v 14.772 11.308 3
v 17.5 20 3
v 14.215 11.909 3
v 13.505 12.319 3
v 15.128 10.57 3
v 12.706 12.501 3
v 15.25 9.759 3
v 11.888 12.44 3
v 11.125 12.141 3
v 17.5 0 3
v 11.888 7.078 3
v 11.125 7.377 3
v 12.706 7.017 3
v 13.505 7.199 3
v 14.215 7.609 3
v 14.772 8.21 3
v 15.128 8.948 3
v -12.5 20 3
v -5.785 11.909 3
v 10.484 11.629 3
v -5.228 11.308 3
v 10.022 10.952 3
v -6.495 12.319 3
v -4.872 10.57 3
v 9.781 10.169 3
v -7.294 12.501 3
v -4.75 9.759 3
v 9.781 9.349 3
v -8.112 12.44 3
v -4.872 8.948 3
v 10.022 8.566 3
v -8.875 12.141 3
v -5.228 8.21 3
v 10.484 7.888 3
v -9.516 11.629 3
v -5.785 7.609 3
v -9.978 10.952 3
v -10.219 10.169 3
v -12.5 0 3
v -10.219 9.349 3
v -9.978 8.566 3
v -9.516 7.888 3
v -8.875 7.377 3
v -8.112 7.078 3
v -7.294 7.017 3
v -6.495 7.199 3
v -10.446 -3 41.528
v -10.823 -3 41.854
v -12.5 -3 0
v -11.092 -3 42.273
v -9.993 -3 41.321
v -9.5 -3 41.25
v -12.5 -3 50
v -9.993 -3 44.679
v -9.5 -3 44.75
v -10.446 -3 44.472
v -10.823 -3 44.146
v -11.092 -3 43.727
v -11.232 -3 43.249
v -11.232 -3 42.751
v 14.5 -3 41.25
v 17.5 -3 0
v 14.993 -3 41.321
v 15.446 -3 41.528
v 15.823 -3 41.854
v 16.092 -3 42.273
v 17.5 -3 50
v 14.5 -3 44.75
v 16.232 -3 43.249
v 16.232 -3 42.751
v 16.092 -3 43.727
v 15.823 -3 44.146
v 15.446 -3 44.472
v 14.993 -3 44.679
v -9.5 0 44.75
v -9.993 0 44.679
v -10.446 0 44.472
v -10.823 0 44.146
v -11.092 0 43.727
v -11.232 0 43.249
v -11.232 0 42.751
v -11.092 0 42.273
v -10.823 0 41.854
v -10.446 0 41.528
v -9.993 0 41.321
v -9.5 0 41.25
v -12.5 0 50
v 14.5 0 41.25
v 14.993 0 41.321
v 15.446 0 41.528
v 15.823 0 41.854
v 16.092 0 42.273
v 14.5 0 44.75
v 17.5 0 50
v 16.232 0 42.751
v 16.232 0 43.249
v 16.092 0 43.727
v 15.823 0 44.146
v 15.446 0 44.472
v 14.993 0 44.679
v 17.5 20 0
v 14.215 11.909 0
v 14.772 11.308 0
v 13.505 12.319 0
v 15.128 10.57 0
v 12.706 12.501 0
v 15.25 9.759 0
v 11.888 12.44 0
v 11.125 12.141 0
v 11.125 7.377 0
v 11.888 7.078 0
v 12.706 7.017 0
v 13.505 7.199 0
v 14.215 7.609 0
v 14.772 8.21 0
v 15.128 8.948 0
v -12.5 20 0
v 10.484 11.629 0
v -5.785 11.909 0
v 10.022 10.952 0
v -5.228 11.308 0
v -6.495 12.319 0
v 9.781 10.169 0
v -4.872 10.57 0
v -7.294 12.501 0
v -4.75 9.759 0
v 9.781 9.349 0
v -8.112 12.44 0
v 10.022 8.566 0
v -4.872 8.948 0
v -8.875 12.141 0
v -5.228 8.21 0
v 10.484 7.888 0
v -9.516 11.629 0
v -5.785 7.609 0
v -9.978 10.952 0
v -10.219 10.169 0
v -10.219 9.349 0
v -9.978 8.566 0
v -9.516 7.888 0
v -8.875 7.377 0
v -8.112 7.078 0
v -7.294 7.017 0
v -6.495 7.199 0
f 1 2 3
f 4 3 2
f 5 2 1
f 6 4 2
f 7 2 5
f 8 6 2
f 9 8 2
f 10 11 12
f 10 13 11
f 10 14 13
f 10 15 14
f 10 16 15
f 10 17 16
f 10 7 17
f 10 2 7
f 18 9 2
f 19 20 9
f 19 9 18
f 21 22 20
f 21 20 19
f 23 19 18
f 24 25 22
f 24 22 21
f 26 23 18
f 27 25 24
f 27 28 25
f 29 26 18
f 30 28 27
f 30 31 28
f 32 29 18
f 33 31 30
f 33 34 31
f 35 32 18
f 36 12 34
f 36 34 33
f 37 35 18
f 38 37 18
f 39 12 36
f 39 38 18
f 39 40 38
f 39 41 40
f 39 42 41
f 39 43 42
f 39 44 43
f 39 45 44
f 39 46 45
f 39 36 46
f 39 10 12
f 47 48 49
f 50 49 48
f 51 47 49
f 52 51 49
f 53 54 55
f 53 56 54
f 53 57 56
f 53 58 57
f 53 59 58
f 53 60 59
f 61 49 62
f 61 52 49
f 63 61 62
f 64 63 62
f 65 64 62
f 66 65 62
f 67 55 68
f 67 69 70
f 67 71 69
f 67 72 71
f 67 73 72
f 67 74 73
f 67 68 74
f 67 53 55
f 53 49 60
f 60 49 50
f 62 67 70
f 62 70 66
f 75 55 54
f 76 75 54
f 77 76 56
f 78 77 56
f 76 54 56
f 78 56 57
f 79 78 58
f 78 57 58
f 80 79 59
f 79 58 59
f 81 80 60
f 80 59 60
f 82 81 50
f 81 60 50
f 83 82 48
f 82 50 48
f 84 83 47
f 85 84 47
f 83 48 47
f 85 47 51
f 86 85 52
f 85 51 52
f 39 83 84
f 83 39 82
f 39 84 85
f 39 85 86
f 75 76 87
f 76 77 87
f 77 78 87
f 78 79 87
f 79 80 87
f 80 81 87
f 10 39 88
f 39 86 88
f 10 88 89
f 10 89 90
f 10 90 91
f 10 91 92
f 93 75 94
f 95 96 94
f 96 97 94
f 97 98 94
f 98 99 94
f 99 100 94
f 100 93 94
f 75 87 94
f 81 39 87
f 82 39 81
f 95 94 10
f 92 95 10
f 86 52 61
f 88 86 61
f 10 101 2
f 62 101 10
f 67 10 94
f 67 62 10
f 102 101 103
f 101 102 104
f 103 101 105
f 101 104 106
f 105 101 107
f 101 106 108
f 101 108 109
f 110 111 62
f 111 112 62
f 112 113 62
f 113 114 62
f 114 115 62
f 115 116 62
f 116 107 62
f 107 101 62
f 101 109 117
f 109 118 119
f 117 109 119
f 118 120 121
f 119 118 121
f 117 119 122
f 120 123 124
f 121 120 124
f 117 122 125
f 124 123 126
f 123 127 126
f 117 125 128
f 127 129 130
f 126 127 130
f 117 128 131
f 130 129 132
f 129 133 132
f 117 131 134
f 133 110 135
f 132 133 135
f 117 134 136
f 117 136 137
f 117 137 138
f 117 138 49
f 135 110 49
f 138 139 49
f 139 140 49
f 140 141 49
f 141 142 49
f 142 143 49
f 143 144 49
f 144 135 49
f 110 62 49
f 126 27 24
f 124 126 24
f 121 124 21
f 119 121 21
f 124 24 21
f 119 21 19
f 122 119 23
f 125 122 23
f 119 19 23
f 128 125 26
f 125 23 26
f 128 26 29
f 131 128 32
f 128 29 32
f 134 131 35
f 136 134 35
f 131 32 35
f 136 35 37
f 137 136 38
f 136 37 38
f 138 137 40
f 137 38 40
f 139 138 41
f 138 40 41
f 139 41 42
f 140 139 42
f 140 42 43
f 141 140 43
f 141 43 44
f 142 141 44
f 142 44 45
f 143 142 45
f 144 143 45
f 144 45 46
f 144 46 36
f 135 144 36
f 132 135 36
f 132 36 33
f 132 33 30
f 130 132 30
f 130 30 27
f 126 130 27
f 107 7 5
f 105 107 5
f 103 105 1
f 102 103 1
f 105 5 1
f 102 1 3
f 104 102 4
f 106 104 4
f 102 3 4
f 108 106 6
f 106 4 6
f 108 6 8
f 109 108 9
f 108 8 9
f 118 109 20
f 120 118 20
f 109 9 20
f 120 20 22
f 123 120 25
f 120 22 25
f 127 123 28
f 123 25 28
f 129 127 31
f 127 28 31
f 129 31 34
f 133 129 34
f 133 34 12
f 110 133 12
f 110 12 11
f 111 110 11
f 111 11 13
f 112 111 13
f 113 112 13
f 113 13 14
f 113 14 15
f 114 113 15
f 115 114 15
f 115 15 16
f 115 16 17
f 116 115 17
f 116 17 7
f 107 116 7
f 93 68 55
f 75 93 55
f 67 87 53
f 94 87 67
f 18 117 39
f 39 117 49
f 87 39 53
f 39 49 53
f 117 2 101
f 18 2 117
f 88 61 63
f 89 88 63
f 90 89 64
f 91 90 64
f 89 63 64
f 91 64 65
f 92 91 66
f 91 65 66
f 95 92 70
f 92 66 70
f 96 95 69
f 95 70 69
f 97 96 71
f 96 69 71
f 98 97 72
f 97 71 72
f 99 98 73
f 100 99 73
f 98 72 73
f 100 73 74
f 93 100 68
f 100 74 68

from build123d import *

# Parameters (mm, degrees)
F0_W     = 30
F0_H     = 50
F1_DEPTH = 3
F2_W     = 30
F2_H     = 3
F3_DEPTH = 20
F4_R     = 2.75
F5_DEPTH = 3.001
F7_DEPTH = 23.001


with BuildPart() as f1:
    # F0 (on Front) → F1 (new body)
    with BuildSketch(Plane.XZ):
        with Locations((2.5, 25)):
            Rectangle(F0_W, F0_H)
    extrude(amount=F1_DEPTH)

    # F2 (on face) → F3 (join)
    with BuildSketch(Plane(origin=(0, 0, 0), x_dir=(-1, 0, 0), z_dir=(0, 1, 0))):
        with Locations((-2.5, 1.5)):
            Rectangle(F2_W, F2_H)
    extrude(amount=F3_DEPTH)

    # F4 (on face) → F5 (cut, through all)
    with BuildSketch(Plane.XY.offset(3)):
        with Locations((12.5, 9.75894)):
            Circle(F4_R)
        with Locations((-7.5, 9.75894)):
            Circle(F4_R)
    extrude(amount=-F5_DEPTH, mode=Mode.SUBTRACT)

    # F6 (on face) → F7 (cut, through all)
    with BuildSketch(Plane.XZ.offset(3)):
        with BuildLine():
            Line((14.5, 44.75), (-9.5, 44.75))
            ThreePointArc((-9.5, 44.75), (-11.25, 43), (-9.5, 41.25))
            Line((-9.5, 41.25), (14.5, 41.25))
            ThreePointArc((14.5, 41.25), (16.25, 43), (14.5, 44.75))
        make_face()
    extrude(amount=-F7_DEPTH, mode=Mode.SUBTRACT)


solid = f1.part
